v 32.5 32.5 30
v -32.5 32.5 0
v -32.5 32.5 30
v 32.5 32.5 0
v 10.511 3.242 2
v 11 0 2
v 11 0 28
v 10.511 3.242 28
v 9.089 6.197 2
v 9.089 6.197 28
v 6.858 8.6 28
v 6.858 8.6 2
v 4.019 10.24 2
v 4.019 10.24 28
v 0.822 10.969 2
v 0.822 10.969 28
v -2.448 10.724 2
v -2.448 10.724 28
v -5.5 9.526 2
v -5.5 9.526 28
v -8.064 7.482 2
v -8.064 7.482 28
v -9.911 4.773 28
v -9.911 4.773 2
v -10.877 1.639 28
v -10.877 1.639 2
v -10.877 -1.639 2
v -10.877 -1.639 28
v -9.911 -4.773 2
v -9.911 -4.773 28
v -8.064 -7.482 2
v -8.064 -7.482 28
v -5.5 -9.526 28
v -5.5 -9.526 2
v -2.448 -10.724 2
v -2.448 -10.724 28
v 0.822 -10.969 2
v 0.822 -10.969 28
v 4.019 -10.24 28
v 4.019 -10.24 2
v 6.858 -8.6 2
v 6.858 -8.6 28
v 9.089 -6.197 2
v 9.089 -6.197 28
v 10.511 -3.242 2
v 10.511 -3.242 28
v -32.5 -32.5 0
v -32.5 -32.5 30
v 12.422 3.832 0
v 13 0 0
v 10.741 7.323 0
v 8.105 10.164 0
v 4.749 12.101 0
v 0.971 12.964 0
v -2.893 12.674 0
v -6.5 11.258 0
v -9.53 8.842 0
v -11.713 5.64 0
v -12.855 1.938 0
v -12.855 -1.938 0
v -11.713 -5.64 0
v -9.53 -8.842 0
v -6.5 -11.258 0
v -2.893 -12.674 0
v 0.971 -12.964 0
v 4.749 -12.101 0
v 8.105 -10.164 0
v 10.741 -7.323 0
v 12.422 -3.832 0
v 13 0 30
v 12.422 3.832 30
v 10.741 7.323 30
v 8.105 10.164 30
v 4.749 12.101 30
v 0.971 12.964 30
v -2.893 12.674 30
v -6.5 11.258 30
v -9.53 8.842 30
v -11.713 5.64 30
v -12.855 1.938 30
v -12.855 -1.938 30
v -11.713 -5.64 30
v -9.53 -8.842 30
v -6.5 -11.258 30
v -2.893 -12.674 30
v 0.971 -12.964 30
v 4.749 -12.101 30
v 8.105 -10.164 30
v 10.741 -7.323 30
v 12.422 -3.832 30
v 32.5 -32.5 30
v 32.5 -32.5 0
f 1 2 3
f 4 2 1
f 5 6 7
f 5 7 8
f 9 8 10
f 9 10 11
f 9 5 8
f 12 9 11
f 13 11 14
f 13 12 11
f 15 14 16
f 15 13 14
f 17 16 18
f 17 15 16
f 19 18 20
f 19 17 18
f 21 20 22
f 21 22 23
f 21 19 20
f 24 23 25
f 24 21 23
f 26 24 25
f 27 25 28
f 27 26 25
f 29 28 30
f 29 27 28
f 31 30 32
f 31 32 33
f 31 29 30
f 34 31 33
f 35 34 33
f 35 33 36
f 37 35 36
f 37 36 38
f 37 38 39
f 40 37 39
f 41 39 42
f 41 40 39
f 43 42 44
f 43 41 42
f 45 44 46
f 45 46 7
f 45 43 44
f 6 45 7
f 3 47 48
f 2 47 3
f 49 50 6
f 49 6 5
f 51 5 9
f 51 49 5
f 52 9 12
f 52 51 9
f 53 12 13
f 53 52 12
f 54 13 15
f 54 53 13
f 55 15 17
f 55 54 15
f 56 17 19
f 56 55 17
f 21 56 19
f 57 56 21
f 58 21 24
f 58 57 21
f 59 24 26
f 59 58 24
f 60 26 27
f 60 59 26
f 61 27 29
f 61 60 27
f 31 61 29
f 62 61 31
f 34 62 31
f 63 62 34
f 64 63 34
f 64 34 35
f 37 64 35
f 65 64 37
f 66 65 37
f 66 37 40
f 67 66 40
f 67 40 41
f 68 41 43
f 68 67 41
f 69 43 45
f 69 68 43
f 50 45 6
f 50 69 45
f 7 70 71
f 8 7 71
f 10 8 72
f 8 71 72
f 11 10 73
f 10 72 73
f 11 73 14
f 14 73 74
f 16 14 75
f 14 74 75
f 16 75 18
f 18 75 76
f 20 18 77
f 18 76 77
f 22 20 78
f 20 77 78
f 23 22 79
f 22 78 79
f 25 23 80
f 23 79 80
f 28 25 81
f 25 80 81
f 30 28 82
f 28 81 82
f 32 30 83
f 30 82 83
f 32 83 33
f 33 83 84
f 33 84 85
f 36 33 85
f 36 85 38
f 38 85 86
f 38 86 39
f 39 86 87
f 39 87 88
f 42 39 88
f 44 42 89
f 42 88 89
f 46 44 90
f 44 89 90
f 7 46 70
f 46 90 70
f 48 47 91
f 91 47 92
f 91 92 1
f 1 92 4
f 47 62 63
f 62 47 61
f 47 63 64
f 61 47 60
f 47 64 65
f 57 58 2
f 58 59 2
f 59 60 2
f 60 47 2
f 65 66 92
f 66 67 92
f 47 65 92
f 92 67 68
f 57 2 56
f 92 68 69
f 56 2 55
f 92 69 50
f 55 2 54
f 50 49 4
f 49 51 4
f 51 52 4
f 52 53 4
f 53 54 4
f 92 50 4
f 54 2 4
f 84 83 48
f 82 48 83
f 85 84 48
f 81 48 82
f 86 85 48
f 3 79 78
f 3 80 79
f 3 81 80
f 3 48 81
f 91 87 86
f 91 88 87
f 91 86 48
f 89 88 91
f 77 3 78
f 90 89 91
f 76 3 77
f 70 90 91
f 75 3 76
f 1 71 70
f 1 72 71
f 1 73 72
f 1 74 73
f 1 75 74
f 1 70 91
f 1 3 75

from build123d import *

# Parameters (mm, degrees)
SKETCH_1_W      = 65
SKETCH_1_H      = 65
SKETCH_1_R      = 11
EXTRUDE_1_DEPTH = 30
CHAMFER_1_SIZE  = 2


with BuildPart() as part:
    # Эскиз1 → Бобышка-Вытянуть1 (new body)
    with BuildSketch(Plane.XY):
        Rectangle(SKETCH_1_W, SKETCH_1_H)
        Circle(SKETCH_1_R, mode=Mode.SUBTRACT)
    extrude(amount=EXTRUDE_1_DEPTH)

    # Фаска1
    chamfer_1_edges = [part.edges().sort_by_distance(p)[0] for p in [
        (-11, 0, 0),
        (-11, 0, 30),
    ]]
    chamfer(chamfer_1_edges, length=CHAMFER_1_SIZE)


solid = part.part
